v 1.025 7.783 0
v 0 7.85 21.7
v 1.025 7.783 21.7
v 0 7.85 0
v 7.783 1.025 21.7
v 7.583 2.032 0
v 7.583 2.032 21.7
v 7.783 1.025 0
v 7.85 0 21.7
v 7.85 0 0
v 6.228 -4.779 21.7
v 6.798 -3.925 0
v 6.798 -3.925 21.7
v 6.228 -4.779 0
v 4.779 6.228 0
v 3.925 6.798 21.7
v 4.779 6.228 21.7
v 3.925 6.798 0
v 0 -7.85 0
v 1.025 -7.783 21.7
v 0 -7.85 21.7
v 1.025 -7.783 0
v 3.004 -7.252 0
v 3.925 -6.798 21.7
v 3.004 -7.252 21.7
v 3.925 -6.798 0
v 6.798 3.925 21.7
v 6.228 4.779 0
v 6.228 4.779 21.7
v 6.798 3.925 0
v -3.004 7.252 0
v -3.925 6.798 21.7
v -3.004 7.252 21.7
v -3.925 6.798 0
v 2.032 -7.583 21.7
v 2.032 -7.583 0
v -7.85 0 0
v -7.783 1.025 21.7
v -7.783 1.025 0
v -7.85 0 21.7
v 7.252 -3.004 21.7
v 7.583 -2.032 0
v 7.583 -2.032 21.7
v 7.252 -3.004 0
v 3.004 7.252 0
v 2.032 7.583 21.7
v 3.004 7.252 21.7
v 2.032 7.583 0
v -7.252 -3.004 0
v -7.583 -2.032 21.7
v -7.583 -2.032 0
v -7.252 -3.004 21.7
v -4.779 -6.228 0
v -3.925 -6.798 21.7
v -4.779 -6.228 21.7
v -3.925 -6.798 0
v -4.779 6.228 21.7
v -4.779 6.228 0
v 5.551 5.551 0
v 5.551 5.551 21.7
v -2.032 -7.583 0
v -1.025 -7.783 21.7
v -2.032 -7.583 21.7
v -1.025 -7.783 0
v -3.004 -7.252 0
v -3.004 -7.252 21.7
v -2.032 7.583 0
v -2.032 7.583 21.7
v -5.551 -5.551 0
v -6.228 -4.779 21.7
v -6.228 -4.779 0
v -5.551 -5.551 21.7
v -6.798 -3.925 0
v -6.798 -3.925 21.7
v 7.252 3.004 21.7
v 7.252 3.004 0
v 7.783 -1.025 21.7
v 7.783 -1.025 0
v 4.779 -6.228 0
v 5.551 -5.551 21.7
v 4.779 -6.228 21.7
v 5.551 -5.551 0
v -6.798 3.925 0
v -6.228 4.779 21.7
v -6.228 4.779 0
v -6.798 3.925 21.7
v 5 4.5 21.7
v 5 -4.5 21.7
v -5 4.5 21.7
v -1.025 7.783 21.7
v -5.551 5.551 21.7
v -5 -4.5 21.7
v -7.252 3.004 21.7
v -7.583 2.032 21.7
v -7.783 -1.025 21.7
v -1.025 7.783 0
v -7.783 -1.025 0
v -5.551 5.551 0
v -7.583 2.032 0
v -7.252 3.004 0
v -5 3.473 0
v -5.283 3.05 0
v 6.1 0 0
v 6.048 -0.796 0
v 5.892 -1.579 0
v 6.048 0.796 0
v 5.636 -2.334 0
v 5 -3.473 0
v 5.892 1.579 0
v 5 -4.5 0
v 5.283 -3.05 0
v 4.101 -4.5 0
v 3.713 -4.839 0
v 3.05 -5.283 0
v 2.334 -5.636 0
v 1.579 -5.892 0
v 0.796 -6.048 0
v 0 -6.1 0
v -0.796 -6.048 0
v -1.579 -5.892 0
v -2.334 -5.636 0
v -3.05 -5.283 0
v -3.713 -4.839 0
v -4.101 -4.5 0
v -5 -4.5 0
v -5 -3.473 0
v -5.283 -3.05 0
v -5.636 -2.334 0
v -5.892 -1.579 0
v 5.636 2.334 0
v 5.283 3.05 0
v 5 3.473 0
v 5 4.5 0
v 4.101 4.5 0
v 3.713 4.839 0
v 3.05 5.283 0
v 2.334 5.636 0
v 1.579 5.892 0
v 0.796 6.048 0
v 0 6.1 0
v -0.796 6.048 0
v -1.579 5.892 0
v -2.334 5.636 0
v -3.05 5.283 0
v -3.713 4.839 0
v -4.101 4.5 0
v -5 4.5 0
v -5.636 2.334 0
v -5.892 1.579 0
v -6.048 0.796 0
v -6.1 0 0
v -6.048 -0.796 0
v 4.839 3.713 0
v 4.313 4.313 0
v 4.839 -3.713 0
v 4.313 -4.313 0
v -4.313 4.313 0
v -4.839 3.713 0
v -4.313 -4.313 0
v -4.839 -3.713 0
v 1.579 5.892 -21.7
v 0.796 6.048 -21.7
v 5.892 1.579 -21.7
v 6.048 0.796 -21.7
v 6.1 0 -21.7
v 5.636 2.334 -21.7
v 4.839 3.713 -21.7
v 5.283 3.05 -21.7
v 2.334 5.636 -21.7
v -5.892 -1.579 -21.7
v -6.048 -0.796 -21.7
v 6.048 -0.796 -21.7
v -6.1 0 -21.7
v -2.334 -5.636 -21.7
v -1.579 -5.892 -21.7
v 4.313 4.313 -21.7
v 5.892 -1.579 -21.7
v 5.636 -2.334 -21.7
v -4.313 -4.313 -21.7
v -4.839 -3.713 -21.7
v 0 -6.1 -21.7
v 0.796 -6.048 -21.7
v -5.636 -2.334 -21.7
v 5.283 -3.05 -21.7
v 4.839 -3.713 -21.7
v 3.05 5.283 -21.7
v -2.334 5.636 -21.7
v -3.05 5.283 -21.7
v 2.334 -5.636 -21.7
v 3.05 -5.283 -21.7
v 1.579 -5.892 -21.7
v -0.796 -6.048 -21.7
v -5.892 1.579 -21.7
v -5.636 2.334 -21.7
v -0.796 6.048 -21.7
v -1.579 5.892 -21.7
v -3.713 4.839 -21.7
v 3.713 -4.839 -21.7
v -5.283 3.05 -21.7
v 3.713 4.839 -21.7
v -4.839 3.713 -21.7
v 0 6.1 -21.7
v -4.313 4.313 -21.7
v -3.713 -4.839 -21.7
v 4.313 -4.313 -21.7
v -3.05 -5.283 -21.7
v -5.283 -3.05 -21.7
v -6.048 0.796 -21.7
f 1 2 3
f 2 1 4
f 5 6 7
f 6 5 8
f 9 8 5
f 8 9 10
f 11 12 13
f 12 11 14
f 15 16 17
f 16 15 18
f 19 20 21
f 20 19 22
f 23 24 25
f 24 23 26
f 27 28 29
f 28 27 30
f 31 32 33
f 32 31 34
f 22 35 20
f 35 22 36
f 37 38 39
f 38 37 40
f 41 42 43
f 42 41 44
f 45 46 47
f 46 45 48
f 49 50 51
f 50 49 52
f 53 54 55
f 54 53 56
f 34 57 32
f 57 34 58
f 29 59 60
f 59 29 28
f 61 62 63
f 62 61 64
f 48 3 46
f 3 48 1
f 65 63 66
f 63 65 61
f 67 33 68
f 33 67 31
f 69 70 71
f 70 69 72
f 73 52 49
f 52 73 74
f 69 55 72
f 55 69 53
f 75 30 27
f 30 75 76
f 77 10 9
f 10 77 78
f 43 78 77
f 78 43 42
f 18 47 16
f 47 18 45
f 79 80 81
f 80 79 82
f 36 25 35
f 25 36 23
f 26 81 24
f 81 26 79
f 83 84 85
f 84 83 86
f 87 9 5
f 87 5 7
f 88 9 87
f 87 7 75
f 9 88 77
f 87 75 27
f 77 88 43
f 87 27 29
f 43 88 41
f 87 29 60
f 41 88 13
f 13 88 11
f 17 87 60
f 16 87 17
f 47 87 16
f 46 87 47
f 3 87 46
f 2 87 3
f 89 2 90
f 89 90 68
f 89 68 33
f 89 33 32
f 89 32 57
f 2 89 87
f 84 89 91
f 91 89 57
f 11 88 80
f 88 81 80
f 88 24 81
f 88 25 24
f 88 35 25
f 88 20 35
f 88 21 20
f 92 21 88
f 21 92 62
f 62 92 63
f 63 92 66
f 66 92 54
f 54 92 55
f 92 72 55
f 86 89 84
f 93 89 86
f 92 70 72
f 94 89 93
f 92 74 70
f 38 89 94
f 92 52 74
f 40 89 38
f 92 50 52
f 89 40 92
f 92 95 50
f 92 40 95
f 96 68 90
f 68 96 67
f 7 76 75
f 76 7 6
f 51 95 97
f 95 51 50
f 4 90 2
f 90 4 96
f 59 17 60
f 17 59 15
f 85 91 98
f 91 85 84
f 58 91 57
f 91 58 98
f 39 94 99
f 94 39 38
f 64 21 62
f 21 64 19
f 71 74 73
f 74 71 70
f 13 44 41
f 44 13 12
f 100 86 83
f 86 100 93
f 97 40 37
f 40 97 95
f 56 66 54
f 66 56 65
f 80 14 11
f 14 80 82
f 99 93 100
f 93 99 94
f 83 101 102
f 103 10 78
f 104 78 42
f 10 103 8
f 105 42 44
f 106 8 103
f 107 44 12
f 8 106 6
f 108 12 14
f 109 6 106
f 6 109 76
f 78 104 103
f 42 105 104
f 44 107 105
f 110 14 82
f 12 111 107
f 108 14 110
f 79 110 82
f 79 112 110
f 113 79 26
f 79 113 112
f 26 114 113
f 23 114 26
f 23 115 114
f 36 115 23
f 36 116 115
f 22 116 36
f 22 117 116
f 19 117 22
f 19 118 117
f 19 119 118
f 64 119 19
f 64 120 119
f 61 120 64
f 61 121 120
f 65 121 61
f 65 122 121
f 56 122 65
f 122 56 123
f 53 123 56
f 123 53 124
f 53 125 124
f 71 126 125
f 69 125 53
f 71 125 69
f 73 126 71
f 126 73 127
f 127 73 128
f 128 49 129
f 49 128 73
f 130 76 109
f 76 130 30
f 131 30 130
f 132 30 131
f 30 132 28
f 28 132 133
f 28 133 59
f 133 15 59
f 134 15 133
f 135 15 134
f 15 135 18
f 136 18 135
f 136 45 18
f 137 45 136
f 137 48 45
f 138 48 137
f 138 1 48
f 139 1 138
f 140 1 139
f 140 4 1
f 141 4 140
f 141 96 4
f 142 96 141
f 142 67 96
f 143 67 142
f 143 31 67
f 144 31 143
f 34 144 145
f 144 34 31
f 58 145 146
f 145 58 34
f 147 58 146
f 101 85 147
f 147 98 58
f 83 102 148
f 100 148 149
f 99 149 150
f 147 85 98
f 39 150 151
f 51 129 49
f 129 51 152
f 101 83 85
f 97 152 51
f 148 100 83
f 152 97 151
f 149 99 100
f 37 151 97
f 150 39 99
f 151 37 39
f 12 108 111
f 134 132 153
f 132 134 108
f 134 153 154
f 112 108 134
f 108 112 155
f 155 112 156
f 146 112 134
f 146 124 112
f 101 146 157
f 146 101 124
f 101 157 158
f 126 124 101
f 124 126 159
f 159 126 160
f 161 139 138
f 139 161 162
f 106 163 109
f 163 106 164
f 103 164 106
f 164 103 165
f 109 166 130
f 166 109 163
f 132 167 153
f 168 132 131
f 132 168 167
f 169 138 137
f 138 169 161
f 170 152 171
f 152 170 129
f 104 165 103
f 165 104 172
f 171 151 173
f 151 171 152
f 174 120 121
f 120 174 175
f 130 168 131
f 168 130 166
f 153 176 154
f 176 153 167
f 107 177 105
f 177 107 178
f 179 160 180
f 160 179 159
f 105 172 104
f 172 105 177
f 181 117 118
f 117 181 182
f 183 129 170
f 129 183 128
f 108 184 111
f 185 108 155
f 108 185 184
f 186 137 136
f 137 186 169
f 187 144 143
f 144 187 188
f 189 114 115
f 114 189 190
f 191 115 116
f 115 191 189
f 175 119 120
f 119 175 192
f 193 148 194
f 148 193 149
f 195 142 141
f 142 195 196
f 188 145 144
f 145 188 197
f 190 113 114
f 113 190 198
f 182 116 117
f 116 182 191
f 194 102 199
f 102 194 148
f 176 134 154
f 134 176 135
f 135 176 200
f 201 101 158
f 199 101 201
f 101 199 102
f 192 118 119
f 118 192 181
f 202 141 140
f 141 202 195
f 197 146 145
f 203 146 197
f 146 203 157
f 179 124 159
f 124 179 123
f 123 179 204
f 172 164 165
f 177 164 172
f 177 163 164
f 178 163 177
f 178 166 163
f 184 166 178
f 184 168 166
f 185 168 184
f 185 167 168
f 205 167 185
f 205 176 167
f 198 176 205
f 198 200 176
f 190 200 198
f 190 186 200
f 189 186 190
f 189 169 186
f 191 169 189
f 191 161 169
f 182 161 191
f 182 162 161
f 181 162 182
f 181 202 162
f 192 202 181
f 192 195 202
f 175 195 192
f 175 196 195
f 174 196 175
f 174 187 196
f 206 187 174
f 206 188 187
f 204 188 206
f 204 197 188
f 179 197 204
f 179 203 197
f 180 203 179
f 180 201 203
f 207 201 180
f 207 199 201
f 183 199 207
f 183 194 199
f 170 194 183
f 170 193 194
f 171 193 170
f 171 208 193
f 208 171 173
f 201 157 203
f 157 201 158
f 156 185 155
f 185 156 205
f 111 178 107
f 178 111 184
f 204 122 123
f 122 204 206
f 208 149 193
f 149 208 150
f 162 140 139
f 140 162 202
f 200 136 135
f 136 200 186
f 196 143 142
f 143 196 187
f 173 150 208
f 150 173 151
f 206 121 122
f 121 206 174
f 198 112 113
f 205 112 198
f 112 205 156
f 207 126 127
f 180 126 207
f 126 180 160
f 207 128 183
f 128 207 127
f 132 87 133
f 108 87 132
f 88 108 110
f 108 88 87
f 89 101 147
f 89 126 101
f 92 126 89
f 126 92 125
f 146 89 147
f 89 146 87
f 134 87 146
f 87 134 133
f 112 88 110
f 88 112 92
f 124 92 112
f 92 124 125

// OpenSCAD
// Snap-on tube clip for a lab stand rod, printed flat with a Z height of 10 mm.
// Snaps onto a round rod (e.g. a 12.7 mm lab stand rod) and a tube (e.g. a 6 mm id
// tube) next to each other. NOVEL general part.
//

rod_d   = 12.7;
wall    = 3;
tubing_d= 6;
tubing_h= 3;
bridge_w= 6;
opening_w = 10;

$fn = 48;

ring_o  = rod_d + wall;
ring_i  = rod_d - 0.5;                 // slightly smaller than the rod for a better grip
tube_o  = tubing_d + 2 * wall;

difference() {
    union() {
        cylinder(h = ring_o + 2 * wall, d = ring_o);              // ring: outer band around the rod
        translate([0, 0, -ring_o - 2 * wall]) cylinder(h = ring_o + 2 * wall, d = ring_i);
    }
    translate([-opening_w / 2, -4.5, 0]) cube([opening_w, 9, ring_o + 2 * wall]);                 // snap opening: remove X < 0 and -5 < y < 5
    translate([15 - 0.01, -3, 0]) cylinder(h = tubing_h, d = tube_o);                        // tube ring: band around the tube
    translate([15 + bridge_w / 2, -3, 0]) cube([bridge_w, 6, ring_o + 2 * wall]);                   // bridge between the two rings
}
